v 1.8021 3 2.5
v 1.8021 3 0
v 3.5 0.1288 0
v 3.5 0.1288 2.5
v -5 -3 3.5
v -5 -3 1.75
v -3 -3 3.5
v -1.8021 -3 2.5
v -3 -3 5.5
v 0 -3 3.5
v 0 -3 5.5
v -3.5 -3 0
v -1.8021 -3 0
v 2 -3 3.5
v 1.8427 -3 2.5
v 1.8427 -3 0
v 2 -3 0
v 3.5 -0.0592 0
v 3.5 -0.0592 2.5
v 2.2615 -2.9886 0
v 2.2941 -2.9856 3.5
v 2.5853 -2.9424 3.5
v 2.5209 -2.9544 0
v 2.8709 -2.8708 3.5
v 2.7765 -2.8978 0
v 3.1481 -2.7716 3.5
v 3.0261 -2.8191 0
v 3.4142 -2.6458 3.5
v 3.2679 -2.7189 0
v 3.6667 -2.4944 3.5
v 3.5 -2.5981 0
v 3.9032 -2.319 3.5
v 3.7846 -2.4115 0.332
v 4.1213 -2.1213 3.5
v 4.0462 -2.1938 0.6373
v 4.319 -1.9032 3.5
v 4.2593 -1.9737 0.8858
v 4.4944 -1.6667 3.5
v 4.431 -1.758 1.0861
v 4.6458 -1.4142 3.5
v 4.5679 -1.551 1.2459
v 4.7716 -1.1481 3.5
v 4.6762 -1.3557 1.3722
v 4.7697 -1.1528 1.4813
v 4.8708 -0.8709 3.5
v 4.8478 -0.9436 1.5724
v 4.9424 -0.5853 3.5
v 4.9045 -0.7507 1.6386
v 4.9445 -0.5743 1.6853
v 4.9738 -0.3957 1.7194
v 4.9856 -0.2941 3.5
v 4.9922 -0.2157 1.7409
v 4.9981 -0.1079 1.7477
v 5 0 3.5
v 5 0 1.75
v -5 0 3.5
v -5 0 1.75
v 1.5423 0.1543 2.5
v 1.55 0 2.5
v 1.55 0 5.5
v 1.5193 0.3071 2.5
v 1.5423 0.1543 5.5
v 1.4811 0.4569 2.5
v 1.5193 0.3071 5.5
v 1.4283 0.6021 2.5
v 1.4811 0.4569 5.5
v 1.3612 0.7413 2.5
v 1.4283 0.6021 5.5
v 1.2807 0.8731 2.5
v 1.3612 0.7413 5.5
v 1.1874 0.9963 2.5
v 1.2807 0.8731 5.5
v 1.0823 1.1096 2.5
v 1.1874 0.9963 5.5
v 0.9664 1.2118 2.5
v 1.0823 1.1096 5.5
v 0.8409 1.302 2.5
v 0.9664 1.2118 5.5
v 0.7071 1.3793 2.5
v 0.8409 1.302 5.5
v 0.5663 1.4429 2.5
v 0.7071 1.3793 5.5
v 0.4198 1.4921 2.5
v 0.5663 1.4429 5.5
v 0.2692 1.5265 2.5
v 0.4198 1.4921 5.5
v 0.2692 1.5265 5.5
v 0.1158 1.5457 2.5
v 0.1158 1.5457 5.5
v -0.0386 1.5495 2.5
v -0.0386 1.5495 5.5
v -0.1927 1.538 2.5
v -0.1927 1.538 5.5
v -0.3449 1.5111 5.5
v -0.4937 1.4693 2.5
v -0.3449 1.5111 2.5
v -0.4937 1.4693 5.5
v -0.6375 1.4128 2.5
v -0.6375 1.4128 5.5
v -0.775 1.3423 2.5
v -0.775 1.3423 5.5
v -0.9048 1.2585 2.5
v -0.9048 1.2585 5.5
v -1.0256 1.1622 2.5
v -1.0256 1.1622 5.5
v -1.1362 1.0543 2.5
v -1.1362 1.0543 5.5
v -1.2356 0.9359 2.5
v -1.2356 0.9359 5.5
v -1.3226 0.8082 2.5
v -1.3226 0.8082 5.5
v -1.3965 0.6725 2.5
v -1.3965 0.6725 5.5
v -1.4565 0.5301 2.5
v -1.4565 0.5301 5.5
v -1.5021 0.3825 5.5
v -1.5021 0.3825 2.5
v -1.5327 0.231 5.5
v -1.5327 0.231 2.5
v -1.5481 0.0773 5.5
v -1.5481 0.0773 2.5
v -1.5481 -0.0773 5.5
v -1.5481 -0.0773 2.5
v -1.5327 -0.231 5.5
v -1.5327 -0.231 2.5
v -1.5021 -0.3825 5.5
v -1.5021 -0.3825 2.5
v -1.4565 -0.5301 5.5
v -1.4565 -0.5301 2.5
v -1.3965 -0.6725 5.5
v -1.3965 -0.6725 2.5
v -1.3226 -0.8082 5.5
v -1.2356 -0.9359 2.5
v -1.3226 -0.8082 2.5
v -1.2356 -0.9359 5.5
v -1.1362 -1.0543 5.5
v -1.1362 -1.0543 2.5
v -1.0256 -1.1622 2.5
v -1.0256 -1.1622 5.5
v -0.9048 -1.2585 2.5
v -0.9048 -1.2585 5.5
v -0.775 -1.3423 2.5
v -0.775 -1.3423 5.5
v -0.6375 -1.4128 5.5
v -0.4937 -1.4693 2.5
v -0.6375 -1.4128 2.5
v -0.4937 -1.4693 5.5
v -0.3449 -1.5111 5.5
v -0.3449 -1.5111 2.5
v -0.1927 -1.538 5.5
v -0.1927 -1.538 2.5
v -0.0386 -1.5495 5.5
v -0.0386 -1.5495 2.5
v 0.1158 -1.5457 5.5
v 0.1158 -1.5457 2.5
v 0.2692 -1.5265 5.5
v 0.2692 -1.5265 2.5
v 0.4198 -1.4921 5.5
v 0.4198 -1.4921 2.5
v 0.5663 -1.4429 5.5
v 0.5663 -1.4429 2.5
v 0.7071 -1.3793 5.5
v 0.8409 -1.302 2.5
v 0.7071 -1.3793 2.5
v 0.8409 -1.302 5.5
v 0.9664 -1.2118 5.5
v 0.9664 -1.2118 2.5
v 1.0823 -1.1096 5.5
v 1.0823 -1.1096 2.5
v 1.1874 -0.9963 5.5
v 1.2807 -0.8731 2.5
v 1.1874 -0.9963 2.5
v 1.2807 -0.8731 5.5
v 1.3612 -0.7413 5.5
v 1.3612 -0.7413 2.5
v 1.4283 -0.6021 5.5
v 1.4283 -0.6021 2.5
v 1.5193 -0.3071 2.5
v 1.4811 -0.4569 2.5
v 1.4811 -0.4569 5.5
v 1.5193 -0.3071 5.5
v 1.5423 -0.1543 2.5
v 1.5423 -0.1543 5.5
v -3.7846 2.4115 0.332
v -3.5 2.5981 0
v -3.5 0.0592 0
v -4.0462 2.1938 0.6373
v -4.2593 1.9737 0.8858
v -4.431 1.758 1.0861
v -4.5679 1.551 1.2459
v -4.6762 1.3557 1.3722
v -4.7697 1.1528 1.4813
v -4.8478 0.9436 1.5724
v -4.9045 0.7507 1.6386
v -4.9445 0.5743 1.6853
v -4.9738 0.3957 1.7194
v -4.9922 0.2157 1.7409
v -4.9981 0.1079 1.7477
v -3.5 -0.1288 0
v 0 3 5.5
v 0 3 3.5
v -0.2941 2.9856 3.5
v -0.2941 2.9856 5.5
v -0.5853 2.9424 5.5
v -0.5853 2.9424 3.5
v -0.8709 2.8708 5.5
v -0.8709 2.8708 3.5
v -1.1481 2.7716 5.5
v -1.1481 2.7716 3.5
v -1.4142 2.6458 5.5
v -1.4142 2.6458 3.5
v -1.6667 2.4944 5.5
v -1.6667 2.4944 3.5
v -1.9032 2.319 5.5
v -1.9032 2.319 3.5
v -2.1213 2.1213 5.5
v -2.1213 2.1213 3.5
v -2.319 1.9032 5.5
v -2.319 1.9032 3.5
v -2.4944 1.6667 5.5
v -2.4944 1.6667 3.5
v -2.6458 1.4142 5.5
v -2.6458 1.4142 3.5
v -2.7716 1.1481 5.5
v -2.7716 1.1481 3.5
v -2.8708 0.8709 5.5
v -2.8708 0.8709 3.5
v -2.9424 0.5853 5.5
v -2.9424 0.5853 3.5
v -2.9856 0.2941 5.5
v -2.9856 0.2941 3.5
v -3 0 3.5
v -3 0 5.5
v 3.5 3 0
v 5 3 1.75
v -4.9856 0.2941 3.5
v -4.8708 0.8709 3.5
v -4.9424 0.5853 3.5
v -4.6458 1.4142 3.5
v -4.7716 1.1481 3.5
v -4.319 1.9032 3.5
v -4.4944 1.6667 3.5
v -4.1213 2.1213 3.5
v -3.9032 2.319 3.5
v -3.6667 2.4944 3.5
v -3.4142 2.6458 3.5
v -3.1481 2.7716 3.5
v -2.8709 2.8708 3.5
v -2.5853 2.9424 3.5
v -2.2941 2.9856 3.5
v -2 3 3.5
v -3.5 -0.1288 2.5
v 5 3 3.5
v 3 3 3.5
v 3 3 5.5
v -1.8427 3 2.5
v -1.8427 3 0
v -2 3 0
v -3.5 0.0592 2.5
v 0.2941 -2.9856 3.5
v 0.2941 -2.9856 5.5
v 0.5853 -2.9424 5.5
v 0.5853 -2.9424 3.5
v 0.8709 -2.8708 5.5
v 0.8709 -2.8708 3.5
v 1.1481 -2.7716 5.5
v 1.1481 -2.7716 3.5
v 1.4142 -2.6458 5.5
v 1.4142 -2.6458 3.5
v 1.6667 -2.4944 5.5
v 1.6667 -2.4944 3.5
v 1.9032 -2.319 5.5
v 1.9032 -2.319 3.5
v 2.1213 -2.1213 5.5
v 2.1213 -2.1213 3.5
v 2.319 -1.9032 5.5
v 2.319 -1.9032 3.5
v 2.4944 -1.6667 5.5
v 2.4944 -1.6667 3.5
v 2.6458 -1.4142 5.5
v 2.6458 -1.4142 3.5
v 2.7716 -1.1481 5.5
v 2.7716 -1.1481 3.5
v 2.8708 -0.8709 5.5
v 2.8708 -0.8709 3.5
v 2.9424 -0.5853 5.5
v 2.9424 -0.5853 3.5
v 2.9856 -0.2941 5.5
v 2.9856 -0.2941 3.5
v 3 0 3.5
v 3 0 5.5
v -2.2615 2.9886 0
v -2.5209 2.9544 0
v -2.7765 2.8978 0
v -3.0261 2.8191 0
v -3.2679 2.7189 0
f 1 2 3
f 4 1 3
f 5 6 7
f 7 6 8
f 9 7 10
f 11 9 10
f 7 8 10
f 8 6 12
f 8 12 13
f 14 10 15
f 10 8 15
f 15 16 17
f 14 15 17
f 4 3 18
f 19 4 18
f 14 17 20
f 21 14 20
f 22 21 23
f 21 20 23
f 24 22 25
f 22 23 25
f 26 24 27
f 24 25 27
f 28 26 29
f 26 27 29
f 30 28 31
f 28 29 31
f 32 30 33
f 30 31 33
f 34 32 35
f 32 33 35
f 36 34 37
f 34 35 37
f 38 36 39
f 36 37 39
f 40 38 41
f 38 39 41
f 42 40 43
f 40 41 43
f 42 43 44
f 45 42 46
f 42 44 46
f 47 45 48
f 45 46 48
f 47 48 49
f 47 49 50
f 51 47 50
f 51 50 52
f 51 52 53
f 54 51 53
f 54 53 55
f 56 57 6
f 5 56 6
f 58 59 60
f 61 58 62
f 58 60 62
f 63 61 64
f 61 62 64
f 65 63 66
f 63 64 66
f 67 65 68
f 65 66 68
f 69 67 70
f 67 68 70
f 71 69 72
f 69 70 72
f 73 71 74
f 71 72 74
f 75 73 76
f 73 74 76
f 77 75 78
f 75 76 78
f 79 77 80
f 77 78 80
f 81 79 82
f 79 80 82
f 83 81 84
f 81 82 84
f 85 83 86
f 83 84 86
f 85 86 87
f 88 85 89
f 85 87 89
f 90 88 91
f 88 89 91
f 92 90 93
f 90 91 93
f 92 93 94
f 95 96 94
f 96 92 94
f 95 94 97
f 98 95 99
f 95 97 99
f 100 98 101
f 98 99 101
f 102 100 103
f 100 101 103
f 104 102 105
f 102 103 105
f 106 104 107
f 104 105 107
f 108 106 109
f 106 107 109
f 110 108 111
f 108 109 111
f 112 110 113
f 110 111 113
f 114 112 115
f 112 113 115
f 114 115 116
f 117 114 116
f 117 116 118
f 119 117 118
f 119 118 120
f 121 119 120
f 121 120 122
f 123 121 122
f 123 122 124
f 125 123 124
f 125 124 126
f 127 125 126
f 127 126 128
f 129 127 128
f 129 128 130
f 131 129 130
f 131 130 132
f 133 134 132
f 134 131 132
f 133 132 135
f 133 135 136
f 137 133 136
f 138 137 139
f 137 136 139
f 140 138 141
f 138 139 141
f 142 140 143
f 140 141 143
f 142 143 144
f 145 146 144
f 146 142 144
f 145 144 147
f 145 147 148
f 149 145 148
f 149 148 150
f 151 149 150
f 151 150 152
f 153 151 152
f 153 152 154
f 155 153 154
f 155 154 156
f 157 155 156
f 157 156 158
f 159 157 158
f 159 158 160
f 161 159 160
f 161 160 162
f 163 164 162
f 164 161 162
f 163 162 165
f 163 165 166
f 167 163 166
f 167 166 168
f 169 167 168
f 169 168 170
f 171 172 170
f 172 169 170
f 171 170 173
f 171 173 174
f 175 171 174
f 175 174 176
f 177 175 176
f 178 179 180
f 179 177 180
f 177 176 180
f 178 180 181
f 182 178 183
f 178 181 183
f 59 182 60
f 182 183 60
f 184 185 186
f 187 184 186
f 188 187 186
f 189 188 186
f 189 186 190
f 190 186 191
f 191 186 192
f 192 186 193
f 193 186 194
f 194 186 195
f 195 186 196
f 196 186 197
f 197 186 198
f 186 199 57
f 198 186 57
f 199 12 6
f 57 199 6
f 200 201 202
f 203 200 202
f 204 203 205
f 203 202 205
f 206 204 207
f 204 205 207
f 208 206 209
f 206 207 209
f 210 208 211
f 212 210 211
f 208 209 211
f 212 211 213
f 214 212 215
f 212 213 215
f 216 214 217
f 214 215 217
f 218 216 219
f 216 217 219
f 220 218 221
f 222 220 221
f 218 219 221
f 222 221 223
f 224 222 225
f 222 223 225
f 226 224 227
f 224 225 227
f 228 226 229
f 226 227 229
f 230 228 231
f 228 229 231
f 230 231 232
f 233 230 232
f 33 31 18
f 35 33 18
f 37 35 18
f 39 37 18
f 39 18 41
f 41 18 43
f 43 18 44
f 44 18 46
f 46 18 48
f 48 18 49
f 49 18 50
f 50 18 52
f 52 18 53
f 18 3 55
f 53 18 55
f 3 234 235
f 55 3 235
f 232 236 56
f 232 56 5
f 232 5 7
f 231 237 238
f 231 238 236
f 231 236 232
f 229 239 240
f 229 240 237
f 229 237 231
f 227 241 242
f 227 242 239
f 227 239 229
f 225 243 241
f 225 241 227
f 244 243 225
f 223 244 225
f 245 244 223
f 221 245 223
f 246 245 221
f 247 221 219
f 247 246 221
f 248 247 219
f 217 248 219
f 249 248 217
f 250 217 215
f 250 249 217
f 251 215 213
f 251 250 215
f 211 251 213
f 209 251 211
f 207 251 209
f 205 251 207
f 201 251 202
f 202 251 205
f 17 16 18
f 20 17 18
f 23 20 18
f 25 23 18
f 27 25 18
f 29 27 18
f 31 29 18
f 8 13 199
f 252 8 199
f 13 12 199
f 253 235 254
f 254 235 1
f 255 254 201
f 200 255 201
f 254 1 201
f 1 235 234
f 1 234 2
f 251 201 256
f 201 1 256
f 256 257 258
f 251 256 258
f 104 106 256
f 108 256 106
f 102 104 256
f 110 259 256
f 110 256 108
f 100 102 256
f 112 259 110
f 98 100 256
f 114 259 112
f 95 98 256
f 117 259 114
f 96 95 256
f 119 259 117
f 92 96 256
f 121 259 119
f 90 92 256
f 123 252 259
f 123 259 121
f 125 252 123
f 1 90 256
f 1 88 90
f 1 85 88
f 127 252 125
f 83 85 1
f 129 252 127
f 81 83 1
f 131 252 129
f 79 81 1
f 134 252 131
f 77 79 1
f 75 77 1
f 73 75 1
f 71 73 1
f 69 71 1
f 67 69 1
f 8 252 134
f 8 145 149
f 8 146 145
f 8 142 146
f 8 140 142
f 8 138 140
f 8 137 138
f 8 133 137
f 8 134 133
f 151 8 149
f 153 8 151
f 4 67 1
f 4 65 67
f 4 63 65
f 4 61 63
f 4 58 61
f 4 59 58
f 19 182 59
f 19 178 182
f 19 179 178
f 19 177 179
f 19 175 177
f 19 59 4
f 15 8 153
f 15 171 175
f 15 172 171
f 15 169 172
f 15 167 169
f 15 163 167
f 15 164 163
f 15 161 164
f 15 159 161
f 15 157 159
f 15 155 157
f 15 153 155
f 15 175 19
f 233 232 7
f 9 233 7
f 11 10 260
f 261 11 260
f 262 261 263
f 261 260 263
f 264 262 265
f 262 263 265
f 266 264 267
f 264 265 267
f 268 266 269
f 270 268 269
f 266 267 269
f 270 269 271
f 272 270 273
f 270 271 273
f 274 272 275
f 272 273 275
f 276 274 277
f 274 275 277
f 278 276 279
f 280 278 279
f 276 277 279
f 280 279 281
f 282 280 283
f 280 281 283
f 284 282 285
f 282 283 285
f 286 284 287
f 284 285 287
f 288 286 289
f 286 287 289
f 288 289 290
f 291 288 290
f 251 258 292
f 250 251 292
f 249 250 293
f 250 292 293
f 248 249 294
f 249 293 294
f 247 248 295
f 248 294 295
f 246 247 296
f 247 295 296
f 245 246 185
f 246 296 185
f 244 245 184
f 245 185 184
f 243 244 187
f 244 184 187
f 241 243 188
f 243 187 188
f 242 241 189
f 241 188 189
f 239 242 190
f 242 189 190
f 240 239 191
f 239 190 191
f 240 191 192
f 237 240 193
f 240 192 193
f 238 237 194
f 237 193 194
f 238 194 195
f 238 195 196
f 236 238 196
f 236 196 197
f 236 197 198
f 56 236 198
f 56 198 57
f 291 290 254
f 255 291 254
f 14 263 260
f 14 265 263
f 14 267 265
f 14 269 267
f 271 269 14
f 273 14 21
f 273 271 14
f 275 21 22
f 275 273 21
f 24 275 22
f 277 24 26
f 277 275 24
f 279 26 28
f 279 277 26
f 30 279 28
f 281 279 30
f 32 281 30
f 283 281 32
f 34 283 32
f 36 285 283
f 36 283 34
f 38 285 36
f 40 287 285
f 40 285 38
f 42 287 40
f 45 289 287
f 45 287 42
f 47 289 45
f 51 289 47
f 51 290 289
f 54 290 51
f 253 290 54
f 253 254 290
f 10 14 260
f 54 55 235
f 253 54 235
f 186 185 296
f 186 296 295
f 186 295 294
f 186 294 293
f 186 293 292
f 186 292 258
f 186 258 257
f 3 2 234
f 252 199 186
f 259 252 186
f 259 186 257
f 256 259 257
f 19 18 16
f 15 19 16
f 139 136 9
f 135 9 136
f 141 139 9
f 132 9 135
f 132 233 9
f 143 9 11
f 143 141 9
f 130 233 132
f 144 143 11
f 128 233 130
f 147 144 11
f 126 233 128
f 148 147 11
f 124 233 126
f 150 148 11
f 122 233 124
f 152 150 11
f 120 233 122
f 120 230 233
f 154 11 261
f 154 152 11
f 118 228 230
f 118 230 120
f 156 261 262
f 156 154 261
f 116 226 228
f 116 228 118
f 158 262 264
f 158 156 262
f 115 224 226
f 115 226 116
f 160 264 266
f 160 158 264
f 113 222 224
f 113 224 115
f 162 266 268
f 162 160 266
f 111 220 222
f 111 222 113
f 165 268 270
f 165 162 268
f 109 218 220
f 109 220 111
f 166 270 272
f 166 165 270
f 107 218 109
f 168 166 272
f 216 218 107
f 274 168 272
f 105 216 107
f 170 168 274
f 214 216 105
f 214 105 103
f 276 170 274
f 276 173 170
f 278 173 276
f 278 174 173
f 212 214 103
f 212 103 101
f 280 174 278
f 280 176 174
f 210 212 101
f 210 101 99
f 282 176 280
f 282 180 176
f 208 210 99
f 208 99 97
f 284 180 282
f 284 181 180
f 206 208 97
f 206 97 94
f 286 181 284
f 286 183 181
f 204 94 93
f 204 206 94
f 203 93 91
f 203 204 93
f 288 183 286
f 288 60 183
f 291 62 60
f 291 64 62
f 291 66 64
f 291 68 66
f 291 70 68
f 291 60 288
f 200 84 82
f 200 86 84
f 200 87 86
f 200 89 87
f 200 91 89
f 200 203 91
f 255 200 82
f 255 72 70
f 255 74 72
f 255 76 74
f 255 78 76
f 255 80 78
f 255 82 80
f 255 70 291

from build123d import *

# Parameters (mm, degrees)
F1_DEPTH  = 3.5
F3_DEPTH  = 2
F4_R      = 1.55
F5_DEPTH  = 25
F7_DEPTH  = 25
F9_DEPTH  = 25
F10_R     = 1.55
F11_DEPTH = 2.5


with BuildPart() as f1:
    # F0 (on Top) → F1 (new body)
    with BuildSketch(Plane.XY):
        with BuildLine():
            Line((-5, 0), (-5, -3))
            Line((-5, -3), (2, -3))
            ThreePointArc((2, -3), (4.1213203436, -2.1213203436), (5, 0))
            Line((5, 0), (5, 3))
            Line((5, 3), (-2, 3))
            ThreePointArc((-2, 3), (-4.1213203436, 2.1213203436), (-5, 0))
        make_face()
    extrude(amount=F1_DEPTH)

    # F2 (on face) → F3 (join)
    with BuildSketch(Plane.XY.offset(3.5)):
        with BuildLine():
            Line((3, 0), (3, 3))
            Line((3, 3), (0, 3))
            ThreePointArc((0, 3), (-2.1213203436, 2.1213203436), (-3, 0))
            Line((-3, 0), (-3, -3))
            Line((-3, -3), (0, -3))
            ThreePointArc((0, -3), (2.1213203436, -2.1213203436), (3, 0))
        make_face()
    extrude(amount=F3_DEPTH)

    # F4 (on face) → F5 (cut)
    with BuildSketch(Plane.XY.offset(5.5)):
        Circle(F4_R)
    extrude(amount=-F5_DEPTH, mode=Mode.SUBTRACT)

    # F6 (on face) → F7 (cut)
    with BuildSketch(Plane.XZ.offset(3)):
        Polygon((-3.5, 0), (-5, 1.75), (-5, 0), align=None)
    extrude(amount=-F7_DEPTH, mode=Mode.SUBTRACT)

    # F8 (on face) → F9 (cut)
    with BuildSketch(Plane(origin=(0, 3, 0), x_dir=(-1, 0, 0), z_dir=(0, 1, 0))):
        Polygon((-5, 0), (-3.5, 0), (-5, 1.75), align=None)
    extrude(amount=-F9_DEPTH, mode=Mode.SUBTRACT)

    # F10 (on face) → F11 (cut)
    with BuildSketch(Plane(origin=(0, 0, 0), x_dir=(1, 0, 0), z_dir=(0, 0, -1))):
        Polygon((1.8021214103, -3), (3.5, -0.128752487), (3.5, 0.0591513549), (1.8427445262, 3), (-1.8021214103, 3), (-3.5, 0.128752487), (-3.5, -0.0591513549), (-1.8427445262, -3), align=None)
        Circle(F10_R, mode=Mode.SUBTRACT)
    extrude(amount=-F11_DEPTH, mode=Mode.SUBTRACT)


solid = f1.part
